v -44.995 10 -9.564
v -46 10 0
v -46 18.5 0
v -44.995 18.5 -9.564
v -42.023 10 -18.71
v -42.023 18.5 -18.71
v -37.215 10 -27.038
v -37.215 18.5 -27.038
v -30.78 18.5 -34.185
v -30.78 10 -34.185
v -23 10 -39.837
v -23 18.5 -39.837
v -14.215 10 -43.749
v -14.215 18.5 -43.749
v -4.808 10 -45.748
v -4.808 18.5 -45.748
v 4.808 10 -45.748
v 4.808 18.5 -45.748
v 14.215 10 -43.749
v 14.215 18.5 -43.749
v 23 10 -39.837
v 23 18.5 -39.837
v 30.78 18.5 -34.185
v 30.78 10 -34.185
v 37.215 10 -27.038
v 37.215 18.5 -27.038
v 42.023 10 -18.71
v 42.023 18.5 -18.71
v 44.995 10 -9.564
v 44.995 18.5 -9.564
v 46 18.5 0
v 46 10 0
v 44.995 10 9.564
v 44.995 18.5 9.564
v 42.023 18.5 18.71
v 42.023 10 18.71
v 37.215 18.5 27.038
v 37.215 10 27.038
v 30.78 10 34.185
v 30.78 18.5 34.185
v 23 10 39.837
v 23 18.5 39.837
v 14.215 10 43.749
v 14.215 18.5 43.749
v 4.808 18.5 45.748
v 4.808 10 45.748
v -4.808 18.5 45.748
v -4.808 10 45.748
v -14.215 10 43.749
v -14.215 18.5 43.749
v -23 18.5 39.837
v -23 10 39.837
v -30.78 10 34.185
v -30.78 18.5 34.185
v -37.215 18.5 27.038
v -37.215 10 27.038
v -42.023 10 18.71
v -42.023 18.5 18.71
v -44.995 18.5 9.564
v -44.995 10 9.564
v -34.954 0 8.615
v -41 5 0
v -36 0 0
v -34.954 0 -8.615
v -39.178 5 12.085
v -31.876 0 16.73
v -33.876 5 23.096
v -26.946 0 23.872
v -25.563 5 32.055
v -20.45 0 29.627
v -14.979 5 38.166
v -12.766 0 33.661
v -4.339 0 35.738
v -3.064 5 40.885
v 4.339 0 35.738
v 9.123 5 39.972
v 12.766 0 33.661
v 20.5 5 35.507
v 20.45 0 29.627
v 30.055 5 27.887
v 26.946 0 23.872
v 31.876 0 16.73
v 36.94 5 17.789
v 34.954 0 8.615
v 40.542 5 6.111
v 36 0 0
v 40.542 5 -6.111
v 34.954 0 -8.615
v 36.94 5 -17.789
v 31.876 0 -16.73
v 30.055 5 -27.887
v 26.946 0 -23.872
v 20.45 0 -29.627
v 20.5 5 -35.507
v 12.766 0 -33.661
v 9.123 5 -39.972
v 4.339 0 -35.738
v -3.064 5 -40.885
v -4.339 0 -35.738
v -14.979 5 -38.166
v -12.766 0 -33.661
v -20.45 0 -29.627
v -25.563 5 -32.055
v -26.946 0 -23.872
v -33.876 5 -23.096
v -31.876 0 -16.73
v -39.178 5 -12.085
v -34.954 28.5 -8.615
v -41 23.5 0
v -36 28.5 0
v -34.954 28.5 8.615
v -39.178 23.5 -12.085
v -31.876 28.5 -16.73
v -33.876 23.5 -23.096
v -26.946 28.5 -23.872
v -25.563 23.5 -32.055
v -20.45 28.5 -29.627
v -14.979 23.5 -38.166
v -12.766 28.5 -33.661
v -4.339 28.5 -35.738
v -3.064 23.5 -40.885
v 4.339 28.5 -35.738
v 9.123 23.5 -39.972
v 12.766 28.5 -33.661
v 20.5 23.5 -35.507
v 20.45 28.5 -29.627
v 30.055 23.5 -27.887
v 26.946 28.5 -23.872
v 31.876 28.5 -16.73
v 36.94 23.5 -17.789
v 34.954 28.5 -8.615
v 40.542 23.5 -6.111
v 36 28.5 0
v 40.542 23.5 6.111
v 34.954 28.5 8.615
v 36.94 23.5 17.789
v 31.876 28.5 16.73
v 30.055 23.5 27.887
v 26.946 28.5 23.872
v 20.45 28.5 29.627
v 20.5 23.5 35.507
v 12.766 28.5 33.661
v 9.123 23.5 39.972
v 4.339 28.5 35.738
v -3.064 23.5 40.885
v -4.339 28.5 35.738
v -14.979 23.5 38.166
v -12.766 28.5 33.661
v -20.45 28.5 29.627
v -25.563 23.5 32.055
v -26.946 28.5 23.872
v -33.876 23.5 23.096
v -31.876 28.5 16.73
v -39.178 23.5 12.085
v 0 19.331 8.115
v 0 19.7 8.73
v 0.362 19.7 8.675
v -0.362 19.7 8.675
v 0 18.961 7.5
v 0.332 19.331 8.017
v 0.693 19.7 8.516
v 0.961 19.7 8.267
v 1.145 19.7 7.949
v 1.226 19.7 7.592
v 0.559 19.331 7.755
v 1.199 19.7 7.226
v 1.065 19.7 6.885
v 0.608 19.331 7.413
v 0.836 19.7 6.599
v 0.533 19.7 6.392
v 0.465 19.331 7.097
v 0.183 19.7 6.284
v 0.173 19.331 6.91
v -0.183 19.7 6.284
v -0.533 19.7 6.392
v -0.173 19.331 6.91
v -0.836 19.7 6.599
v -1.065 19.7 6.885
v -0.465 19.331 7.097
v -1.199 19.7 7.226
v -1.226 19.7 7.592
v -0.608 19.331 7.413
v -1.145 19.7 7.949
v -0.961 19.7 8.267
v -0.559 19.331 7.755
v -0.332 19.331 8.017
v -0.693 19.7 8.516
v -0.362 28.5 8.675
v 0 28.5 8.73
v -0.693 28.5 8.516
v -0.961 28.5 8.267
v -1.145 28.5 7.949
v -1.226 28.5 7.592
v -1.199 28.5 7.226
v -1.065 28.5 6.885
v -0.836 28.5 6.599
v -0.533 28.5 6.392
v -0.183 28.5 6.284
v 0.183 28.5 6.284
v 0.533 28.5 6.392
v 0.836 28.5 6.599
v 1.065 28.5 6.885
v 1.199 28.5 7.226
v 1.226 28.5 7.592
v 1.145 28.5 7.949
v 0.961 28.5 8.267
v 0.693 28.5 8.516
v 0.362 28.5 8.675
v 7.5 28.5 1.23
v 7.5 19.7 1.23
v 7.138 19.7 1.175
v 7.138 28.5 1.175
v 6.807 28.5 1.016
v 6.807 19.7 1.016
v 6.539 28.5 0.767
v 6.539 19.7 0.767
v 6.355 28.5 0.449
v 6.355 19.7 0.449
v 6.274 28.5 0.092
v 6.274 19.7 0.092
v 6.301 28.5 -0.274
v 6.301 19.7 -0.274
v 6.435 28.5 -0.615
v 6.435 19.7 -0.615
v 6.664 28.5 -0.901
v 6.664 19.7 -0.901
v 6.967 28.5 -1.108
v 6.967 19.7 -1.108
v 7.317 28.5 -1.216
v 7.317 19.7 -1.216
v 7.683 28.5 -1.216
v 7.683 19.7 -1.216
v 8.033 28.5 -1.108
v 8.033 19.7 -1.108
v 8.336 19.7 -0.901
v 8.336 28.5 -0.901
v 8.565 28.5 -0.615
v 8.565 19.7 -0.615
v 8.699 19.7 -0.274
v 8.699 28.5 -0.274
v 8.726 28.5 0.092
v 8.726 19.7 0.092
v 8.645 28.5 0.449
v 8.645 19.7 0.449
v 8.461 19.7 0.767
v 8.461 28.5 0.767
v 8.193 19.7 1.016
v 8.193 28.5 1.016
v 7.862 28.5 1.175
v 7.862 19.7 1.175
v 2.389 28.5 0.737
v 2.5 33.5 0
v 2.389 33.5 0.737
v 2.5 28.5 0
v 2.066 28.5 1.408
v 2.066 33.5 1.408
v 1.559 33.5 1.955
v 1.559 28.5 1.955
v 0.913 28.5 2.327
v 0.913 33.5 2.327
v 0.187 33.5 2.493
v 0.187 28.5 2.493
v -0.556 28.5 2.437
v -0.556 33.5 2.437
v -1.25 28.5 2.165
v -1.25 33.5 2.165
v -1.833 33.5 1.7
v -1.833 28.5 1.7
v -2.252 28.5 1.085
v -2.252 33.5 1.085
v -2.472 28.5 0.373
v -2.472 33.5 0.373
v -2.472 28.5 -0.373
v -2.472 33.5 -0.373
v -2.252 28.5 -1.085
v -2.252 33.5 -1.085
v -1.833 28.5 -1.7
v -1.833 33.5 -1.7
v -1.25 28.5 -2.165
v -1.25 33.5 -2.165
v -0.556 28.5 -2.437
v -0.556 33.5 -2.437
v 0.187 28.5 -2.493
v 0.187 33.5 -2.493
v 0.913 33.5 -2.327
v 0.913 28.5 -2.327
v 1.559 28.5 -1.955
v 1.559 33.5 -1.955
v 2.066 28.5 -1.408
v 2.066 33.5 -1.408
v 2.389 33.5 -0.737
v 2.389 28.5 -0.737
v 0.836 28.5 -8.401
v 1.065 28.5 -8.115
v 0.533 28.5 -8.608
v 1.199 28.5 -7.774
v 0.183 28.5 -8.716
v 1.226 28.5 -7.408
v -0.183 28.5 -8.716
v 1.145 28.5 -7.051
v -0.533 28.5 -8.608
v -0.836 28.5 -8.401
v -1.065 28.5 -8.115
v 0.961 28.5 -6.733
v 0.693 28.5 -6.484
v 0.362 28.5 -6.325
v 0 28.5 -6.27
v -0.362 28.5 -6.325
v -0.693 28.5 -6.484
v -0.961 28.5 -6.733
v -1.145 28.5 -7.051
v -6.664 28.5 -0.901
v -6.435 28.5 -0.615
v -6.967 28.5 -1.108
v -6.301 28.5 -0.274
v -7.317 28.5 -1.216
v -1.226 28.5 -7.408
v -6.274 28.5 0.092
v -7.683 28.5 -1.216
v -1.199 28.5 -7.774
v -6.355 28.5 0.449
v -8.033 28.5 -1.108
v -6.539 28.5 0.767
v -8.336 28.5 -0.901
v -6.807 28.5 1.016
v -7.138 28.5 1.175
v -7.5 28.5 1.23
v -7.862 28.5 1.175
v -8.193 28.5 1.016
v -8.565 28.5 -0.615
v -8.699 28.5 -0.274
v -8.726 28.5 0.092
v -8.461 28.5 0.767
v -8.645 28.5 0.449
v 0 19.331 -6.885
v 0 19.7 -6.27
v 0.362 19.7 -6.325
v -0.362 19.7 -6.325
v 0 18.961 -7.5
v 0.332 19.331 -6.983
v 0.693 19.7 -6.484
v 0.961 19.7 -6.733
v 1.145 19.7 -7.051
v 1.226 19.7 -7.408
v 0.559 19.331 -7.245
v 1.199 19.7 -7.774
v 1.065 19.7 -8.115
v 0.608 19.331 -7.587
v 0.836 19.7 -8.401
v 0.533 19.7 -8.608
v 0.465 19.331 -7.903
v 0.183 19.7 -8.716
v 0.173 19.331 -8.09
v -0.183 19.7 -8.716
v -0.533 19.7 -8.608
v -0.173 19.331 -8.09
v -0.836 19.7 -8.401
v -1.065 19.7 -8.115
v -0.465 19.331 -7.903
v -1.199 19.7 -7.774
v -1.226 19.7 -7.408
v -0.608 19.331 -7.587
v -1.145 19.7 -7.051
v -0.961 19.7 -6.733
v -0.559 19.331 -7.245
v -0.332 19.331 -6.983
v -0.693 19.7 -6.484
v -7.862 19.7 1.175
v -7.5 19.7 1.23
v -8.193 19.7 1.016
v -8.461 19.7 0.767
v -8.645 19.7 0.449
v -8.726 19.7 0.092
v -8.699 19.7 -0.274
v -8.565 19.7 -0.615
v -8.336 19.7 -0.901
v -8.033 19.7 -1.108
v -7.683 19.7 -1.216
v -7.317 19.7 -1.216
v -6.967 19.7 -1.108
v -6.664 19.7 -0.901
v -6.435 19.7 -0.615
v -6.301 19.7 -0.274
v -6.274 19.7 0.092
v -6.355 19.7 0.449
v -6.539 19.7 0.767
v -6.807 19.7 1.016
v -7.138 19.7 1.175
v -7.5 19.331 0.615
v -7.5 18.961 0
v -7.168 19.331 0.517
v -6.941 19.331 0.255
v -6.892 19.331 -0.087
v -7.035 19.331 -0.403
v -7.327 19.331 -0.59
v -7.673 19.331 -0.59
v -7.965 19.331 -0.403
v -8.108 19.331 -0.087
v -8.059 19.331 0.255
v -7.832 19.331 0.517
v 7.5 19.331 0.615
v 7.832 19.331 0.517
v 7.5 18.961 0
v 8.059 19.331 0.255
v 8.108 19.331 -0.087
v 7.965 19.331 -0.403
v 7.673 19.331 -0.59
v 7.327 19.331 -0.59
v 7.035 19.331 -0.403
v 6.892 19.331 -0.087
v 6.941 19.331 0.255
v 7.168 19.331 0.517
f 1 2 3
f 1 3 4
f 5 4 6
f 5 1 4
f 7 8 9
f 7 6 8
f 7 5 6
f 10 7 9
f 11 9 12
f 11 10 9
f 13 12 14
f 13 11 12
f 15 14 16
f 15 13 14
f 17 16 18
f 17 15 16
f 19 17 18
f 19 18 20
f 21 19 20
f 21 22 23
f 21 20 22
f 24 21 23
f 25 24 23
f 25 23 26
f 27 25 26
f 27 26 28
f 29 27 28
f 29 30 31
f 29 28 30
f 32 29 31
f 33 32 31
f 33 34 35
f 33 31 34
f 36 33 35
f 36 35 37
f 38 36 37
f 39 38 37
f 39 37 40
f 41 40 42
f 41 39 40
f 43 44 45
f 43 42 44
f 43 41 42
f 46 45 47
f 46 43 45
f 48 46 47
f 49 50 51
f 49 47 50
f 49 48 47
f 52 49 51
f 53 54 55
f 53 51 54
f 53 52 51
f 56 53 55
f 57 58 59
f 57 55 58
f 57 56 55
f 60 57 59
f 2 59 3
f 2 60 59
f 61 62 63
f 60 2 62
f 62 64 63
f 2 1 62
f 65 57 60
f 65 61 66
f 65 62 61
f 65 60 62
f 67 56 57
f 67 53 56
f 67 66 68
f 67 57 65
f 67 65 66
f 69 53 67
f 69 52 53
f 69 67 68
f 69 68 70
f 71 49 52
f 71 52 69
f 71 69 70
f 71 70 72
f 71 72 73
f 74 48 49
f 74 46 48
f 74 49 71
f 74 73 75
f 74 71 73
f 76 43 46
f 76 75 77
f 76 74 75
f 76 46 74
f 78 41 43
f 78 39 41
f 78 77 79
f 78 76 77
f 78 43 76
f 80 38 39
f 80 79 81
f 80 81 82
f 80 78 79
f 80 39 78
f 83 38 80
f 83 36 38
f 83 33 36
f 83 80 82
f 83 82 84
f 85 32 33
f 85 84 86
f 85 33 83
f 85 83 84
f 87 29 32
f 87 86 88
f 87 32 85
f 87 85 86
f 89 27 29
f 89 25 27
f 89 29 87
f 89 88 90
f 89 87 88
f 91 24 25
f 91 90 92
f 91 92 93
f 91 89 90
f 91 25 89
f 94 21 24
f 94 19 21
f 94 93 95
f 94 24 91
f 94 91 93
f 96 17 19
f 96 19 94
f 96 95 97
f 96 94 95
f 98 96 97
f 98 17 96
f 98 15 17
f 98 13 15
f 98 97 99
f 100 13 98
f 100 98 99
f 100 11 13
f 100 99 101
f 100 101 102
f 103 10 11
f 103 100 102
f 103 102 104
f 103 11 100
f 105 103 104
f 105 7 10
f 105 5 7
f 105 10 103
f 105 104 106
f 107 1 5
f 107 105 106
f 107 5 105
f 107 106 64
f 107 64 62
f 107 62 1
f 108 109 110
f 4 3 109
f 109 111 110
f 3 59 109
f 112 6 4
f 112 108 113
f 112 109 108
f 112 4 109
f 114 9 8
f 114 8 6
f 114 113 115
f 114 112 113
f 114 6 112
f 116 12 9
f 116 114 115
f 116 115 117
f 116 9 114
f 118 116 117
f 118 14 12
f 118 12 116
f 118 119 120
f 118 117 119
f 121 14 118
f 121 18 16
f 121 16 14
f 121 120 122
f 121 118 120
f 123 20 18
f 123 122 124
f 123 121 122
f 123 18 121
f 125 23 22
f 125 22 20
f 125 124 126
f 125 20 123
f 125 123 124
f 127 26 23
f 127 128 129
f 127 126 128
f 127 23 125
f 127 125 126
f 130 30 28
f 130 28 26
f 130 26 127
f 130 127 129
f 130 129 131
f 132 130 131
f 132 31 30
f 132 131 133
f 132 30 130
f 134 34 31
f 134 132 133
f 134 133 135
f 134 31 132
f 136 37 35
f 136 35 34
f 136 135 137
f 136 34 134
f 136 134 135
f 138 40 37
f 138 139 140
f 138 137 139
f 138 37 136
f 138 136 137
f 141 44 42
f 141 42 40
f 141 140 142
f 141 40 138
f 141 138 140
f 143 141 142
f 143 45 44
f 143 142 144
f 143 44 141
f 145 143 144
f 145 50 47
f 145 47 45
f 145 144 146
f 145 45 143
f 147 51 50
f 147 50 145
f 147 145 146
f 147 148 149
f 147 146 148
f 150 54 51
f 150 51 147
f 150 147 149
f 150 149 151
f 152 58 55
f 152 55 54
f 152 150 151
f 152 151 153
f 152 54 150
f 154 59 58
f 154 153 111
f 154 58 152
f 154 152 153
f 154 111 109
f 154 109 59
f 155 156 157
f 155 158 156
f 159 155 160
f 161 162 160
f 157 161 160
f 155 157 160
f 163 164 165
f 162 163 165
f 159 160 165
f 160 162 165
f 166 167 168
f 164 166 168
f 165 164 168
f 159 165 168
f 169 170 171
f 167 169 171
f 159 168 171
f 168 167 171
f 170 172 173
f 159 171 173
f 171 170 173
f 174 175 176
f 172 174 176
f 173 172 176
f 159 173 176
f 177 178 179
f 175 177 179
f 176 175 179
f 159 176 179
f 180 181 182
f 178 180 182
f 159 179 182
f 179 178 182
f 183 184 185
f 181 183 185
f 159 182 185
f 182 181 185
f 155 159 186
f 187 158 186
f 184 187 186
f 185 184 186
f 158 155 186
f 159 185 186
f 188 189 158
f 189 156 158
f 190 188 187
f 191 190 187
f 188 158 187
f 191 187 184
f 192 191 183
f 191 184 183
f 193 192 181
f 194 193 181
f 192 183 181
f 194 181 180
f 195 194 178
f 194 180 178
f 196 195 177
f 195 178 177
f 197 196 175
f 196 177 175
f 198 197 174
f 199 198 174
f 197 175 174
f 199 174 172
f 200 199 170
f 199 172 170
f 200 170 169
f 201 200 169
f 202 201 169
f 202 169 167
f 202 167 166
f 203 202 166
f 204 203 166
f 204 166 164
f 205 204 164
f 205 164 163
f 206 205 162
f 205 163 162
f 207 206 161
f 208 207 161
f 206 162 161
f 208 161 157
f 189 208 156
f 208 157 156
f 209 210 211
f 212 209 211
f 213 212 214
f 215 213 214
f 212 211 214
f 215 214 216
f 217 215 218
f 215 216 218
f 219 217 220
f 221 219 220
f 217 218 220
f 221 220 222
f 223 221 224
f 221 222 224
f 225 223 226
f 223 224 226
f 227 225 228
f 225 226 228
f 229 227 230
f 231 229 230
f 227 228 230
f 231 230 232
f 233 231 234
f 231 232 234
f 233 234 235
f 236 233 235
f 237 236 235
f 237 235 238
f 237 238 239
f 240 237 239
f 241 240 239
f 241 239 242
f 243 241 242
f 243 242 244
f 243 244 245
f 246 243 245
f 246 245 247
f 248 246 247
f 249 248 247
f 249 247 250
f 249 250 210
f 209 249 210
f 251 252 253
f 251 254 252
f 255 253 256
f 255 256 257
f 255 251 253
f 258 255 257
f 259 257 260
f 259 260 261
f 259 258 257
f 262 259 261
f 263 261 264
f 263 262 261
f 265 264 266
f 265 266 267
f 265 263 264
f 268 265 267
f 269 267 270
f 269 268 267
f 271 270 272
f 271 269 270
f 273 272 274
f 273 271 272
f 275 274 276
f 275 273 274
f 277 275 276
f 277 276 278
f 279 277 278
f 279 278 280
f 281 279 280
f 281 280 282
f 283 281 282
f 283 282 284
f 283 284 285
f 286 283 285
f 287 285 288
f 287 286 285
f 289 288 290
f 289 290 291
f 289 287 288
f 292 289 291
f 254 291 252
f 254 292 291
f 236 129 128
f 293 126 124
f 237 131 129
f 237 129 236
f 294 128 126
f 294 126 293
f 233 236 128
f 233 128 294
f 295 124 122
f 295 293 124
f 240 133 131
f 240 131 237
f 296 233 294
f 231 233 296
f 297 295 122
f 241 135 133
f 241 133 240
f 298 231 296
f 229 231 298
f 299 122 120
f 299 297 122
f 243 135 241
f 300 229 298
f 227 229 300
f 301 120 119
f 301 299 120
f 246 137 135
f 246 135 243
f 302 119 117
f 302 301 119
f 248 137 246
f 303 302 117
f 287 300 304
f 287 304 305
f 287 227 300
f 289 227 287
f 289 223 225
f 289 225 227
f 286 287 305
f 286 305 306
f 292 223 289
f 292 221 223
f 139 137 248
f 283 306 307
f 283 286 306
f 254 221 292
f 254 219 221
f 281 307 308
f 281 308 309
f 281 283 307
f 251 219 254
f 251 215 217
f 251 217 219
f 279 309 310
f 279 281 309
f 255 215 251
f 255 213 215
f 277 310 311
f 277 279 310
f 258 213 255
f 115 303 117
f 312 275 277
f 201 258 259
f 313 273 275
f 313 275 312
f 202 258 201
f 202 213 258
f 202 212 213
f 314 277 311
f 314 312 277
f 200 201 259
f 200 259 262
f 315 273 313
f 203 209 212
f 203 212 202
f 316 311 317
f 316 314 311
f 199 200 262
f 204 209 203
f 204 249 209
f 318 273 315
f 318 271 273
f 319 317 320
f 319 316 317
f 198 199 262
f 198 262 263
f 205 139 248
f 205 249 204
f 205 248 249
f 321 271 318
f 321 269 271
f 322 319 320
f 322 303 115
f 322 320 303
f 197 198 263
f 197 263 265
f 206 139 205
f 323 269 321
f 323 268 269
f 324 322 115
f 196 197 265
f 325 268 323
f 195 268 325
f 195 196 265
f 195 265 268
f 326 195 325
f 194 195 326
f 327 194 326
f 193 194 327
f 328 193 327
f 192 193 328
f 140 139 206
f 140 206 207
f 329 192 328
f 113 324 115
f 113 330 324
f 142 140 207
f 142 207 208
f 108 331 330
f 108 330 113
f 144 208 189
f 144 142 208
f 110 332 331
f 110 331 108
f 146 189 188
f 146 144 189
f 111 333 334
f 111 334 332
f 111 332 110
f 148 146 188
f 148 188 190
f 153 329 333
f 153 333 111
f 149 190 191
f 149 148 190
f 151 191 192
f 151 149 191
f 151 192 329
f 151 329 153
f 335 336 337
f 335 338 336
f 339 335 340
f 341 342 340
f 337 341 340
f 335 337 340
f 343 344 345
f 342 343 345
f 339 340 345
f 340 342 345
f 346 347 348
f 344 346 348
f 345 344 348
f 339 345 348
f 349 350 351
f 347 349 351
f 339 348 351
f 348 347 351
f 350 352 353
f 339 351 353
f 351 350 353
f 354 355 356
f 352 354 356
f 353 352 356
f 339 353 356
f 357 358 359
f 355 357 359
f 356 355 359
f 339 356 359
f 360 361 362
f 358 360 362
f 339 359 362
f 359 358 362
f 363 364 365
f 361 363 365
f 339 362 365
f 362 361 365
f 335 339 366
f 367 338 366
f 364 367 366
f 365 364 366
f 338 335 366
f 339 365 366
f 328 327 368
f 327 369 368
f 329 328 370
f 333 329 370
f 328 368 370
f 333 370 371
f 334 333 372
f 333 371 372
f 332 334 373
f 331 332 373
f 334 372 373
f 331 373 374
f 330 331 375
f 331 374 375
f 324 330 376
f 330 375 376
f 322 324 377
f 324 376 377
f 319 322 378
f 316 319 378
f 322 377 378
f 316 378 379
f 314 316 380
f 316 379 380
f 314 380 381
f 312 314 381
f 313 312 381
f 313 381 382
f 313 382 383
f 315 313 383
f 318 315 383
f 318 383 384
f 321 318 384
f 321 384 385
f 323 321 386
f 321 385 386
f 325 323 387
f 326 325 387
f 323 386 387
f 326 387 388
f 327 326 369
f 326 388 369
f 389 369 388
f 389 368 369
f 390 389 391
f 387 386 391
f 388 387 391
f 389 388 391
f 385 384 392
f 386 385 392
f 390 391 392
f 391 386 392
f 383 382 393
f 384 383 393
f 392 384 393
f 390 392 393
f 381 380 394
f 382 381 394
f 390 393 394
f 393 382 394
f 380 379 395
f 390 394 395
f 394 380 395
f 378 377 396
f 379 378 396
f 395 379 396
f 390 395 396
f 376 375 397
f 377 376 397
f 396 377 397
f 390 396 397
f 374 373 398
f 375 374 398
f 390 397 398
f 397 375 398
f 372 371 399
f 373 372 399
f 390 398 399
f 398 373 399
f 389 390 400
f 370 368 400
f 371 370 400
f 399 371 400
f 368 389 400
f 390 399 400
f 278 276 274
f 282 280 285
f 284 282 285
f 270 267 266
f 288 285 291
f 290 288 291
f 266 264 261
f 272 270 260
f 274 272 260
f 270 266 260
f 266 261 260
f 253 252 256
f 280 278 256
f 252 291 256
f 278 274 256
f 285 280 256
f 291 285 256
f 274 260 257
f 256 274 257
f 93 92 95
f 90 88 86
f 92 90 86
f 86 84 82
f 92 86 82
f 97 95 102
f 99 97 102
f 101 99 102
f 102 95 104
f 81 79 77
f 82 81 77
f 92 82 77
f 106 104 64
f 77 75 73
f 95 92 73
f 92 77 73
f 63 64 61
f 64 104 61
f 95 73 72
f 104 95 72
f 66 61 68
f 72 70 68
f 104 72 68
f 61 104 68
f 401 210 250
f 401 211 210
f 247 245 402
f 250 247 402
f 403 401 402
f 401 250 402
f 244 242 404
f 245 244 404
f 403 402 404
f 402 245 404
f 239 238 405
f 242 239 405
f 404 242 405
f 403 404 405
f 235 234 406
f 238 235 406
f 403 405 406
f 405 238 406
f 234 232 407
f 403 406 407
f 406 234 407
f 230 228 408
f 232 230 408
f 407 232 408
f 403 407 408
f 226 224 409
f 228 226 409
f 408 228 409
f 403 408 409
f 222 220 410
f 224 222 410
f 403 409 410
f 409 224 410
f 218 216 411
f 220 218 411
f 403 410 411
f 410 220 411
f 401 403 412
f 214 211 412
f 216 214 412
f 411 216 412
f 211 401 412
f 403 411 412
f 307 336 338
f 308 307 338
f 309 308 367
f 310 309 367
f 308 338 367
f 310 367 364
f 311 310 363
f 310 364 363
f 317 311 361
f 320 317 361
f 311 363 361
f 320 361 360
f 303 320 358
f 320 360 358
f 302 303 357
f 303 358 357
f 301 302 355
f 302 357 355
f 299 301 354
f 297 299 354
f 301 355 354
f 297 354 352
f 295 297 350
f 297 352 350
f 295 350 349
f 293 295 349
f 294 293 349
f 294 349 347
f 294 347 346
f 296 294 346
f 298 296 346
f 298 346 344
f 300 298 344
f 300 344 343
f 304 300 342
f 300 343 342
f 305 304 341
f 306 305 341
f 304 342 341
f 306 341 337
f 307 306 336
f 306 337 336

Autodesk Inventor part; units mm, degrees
ref_plane "YZ Plane" through (0, 0, 0) normal (1, 0, 0) x (0, 1, 0)
ref_plane "XZ Plane" through (0, 0, 0) normal (0, 1, 0) x (-1, 0, 0)
ref_plane "XY Plane" through (0, 0, 0) normal (0, 0, 1) x (1, 0, 0)
sketch "Sketch1" plane through (0, 0, 0) normal (0, 1, 0) x (-1, 0, 0)
  circle A0 centre (0, 0) radius 46
  dimension "d2" = 92
extrude "Extrusion1" add sketch "Sketch1" along normal blind 28.5
chamfer "Chamfer1" distance 10 angle 45 2 edges at (46, 0, 0) (46, 28.5, 0)
sketch "Sketch2" plane through (0, 28.5, 0) normal (0, 1, 0) x (1, 0, 0)
  circle A0 centre (0, 0) radius 36 projected
  circle A1 centre (0, 0) radius 7.5 construction
  point P0 (-0.3002, 0.0027)
  point P1 (9.3558, -1.447)
  point P2 (7.5, 0)
  point P3 (0, -7.5)
  point P4 (-7.5, 0)
  point P5 (0, 7.5)
  dimension "d13" = 15
hole "Hole1" at (7.5, 28.5, 0) at (0, 28.5, 7.5) at (-7.5, 28.5, 0) at (0, 28.5, -7.5) direction (0, -1, 0) diameter 2.459 depth 8.8 tip angle 118 thread size "M3x0.5" class "6H" standard "ISO Metric profile"
sketch "Sketch3" plane through (0, 28.5, 0) normal (0, -1, 0) x (1, 0, 0)
  circle A0 centre (0, 0) radius 2.5
  dimension "d14" = 5
extrude "Extrusion2" add sketch "Sketch3" against normal blind 5
properties part number "EAGLE POWER 8308"
